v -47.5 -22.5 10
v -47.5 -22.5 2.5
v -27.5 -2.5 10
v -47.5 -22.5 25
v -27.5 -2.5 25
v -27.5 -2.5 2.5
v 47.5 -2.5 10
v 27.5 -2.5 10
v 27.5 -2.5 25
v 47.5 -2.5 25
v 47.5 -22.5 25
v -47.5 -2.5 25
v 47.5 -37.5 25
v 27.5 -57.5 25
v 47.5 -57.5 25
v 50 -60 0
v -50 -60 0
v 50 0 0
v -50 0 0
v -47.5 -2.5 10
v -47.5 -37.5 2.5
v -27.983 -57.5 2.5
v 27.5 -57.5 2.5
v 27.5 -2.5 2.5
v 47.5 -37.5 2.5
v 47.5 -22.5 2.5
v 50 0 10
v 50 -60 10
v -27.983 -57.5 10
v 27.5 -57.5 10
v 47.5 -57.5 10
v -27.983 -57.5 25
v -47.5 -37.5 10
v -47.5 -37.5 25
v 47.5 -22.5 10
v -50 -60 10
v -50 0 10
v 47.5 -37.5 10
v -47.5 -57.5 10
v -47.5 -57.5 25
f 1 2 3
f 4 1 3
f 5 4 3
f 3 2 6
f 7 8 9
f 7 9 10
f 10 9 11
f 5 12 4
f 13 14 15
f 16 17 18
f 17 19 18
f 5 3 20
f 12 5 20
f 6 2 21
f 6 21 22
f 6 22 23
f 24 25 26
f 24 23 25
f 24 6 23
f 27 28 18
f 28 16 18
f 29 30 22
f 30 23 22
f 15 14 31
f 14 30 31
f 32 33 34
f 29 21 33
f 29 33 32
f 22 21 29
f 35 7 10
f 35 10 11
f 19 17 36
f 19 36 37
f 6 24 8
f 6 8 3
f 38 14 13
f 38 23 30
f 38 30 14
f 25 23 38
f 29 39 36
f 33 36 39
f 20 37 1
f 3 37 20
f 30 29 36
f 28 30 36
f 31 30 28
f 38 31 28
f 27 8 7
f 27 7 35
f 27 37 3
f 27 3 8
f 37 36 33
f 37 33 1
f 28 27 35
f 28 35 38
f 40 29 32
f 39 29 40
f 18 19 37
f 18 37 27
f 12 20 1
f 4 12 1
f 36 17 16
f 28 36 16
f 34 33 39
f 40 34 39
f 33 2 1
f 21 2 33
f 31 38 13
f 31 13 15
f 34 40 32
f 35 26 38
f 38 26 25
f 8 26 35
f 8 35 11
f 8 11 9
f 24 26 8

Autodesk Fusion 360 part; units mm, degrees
sketch "Sketch1" plane through (0, 0, 0) normal (0, 0, 1) x (1, 0, 0)
  line L0 (0, 0) -> (50, 0)
  line L1 (0, 0) -> (-50, 0)
  line L2 (0, -60) -> (50, -60)
  line L3 (0, -60) -> (-50, -60)
  line L4 (0, -2.5) -> (47.5, -2.5)
  line L5 (0, -2.5) -> (-47.5, -2.5)
  line L6 (0, -57.5) -> (47.5, -57.5)
  line L7 (0, -57.5) -> (-47.5, -57.5)
  line L8 (-47.5, -2.5) -> (-47.5, -57.5)
  line L9 (47.5, -2.5) -> (47.5, -57.5)
  line L10 (50, -60) -> (50, 0)
  line L11 (-50, -60) -> (-50, 0)
  line L12 (-54.3467, -2.5) -> (-57.3288, -2.5) construction
  line L13 (-47.5, -22.5) -> (47.5, -22.5)
  line L14 (-47.5, 10.1561) -> (-47.5, 7.5248)
  line L15 (-47.5, -22.5) -> (-27.5, -2.5)
  line L16 (27.5, -2.5) -> (27.5, -7.3859)
  line L17 (47.5, -22.5) -> (27.5, -2.5)
  line L18 (-47.5, -37.5) -> (-27.9827, -57.5)
  line L19 (47.5, -37.5) -> (-47.5, -37.5)
  line L20 (27.5, -57.5) -> (47.5, -37.5)
  dimension "d1" = 50
  dimension "d2" = 50
  dimension "d3" = 60
  dimension "d4" = 50
  dimension "d5" = 50
  dimension "d6" = 2.5
  dimension "d7" = 47.5
  dimension "d8" = 47.5
  dimension "d9" = 2.5
  dimension "d10" = 47.5
  dimension "d11" = 47.5
extrude "Extrude1" add sketch "Sketch1" along normal blind 10
extrude "Extrude2" add sketch "Sketch1" along normal blind 25 contours L4 L9 L17 | L5 L8 L15 | L6 L9 L20 | L7 L8 L18
extrude "Extrude3" add sketch "Sketch1" along normal blind 2.5 contours L4 L5 L13 L15 L17 | L8 L9 L13 L19 | L6 L7 L18 L19 L20
